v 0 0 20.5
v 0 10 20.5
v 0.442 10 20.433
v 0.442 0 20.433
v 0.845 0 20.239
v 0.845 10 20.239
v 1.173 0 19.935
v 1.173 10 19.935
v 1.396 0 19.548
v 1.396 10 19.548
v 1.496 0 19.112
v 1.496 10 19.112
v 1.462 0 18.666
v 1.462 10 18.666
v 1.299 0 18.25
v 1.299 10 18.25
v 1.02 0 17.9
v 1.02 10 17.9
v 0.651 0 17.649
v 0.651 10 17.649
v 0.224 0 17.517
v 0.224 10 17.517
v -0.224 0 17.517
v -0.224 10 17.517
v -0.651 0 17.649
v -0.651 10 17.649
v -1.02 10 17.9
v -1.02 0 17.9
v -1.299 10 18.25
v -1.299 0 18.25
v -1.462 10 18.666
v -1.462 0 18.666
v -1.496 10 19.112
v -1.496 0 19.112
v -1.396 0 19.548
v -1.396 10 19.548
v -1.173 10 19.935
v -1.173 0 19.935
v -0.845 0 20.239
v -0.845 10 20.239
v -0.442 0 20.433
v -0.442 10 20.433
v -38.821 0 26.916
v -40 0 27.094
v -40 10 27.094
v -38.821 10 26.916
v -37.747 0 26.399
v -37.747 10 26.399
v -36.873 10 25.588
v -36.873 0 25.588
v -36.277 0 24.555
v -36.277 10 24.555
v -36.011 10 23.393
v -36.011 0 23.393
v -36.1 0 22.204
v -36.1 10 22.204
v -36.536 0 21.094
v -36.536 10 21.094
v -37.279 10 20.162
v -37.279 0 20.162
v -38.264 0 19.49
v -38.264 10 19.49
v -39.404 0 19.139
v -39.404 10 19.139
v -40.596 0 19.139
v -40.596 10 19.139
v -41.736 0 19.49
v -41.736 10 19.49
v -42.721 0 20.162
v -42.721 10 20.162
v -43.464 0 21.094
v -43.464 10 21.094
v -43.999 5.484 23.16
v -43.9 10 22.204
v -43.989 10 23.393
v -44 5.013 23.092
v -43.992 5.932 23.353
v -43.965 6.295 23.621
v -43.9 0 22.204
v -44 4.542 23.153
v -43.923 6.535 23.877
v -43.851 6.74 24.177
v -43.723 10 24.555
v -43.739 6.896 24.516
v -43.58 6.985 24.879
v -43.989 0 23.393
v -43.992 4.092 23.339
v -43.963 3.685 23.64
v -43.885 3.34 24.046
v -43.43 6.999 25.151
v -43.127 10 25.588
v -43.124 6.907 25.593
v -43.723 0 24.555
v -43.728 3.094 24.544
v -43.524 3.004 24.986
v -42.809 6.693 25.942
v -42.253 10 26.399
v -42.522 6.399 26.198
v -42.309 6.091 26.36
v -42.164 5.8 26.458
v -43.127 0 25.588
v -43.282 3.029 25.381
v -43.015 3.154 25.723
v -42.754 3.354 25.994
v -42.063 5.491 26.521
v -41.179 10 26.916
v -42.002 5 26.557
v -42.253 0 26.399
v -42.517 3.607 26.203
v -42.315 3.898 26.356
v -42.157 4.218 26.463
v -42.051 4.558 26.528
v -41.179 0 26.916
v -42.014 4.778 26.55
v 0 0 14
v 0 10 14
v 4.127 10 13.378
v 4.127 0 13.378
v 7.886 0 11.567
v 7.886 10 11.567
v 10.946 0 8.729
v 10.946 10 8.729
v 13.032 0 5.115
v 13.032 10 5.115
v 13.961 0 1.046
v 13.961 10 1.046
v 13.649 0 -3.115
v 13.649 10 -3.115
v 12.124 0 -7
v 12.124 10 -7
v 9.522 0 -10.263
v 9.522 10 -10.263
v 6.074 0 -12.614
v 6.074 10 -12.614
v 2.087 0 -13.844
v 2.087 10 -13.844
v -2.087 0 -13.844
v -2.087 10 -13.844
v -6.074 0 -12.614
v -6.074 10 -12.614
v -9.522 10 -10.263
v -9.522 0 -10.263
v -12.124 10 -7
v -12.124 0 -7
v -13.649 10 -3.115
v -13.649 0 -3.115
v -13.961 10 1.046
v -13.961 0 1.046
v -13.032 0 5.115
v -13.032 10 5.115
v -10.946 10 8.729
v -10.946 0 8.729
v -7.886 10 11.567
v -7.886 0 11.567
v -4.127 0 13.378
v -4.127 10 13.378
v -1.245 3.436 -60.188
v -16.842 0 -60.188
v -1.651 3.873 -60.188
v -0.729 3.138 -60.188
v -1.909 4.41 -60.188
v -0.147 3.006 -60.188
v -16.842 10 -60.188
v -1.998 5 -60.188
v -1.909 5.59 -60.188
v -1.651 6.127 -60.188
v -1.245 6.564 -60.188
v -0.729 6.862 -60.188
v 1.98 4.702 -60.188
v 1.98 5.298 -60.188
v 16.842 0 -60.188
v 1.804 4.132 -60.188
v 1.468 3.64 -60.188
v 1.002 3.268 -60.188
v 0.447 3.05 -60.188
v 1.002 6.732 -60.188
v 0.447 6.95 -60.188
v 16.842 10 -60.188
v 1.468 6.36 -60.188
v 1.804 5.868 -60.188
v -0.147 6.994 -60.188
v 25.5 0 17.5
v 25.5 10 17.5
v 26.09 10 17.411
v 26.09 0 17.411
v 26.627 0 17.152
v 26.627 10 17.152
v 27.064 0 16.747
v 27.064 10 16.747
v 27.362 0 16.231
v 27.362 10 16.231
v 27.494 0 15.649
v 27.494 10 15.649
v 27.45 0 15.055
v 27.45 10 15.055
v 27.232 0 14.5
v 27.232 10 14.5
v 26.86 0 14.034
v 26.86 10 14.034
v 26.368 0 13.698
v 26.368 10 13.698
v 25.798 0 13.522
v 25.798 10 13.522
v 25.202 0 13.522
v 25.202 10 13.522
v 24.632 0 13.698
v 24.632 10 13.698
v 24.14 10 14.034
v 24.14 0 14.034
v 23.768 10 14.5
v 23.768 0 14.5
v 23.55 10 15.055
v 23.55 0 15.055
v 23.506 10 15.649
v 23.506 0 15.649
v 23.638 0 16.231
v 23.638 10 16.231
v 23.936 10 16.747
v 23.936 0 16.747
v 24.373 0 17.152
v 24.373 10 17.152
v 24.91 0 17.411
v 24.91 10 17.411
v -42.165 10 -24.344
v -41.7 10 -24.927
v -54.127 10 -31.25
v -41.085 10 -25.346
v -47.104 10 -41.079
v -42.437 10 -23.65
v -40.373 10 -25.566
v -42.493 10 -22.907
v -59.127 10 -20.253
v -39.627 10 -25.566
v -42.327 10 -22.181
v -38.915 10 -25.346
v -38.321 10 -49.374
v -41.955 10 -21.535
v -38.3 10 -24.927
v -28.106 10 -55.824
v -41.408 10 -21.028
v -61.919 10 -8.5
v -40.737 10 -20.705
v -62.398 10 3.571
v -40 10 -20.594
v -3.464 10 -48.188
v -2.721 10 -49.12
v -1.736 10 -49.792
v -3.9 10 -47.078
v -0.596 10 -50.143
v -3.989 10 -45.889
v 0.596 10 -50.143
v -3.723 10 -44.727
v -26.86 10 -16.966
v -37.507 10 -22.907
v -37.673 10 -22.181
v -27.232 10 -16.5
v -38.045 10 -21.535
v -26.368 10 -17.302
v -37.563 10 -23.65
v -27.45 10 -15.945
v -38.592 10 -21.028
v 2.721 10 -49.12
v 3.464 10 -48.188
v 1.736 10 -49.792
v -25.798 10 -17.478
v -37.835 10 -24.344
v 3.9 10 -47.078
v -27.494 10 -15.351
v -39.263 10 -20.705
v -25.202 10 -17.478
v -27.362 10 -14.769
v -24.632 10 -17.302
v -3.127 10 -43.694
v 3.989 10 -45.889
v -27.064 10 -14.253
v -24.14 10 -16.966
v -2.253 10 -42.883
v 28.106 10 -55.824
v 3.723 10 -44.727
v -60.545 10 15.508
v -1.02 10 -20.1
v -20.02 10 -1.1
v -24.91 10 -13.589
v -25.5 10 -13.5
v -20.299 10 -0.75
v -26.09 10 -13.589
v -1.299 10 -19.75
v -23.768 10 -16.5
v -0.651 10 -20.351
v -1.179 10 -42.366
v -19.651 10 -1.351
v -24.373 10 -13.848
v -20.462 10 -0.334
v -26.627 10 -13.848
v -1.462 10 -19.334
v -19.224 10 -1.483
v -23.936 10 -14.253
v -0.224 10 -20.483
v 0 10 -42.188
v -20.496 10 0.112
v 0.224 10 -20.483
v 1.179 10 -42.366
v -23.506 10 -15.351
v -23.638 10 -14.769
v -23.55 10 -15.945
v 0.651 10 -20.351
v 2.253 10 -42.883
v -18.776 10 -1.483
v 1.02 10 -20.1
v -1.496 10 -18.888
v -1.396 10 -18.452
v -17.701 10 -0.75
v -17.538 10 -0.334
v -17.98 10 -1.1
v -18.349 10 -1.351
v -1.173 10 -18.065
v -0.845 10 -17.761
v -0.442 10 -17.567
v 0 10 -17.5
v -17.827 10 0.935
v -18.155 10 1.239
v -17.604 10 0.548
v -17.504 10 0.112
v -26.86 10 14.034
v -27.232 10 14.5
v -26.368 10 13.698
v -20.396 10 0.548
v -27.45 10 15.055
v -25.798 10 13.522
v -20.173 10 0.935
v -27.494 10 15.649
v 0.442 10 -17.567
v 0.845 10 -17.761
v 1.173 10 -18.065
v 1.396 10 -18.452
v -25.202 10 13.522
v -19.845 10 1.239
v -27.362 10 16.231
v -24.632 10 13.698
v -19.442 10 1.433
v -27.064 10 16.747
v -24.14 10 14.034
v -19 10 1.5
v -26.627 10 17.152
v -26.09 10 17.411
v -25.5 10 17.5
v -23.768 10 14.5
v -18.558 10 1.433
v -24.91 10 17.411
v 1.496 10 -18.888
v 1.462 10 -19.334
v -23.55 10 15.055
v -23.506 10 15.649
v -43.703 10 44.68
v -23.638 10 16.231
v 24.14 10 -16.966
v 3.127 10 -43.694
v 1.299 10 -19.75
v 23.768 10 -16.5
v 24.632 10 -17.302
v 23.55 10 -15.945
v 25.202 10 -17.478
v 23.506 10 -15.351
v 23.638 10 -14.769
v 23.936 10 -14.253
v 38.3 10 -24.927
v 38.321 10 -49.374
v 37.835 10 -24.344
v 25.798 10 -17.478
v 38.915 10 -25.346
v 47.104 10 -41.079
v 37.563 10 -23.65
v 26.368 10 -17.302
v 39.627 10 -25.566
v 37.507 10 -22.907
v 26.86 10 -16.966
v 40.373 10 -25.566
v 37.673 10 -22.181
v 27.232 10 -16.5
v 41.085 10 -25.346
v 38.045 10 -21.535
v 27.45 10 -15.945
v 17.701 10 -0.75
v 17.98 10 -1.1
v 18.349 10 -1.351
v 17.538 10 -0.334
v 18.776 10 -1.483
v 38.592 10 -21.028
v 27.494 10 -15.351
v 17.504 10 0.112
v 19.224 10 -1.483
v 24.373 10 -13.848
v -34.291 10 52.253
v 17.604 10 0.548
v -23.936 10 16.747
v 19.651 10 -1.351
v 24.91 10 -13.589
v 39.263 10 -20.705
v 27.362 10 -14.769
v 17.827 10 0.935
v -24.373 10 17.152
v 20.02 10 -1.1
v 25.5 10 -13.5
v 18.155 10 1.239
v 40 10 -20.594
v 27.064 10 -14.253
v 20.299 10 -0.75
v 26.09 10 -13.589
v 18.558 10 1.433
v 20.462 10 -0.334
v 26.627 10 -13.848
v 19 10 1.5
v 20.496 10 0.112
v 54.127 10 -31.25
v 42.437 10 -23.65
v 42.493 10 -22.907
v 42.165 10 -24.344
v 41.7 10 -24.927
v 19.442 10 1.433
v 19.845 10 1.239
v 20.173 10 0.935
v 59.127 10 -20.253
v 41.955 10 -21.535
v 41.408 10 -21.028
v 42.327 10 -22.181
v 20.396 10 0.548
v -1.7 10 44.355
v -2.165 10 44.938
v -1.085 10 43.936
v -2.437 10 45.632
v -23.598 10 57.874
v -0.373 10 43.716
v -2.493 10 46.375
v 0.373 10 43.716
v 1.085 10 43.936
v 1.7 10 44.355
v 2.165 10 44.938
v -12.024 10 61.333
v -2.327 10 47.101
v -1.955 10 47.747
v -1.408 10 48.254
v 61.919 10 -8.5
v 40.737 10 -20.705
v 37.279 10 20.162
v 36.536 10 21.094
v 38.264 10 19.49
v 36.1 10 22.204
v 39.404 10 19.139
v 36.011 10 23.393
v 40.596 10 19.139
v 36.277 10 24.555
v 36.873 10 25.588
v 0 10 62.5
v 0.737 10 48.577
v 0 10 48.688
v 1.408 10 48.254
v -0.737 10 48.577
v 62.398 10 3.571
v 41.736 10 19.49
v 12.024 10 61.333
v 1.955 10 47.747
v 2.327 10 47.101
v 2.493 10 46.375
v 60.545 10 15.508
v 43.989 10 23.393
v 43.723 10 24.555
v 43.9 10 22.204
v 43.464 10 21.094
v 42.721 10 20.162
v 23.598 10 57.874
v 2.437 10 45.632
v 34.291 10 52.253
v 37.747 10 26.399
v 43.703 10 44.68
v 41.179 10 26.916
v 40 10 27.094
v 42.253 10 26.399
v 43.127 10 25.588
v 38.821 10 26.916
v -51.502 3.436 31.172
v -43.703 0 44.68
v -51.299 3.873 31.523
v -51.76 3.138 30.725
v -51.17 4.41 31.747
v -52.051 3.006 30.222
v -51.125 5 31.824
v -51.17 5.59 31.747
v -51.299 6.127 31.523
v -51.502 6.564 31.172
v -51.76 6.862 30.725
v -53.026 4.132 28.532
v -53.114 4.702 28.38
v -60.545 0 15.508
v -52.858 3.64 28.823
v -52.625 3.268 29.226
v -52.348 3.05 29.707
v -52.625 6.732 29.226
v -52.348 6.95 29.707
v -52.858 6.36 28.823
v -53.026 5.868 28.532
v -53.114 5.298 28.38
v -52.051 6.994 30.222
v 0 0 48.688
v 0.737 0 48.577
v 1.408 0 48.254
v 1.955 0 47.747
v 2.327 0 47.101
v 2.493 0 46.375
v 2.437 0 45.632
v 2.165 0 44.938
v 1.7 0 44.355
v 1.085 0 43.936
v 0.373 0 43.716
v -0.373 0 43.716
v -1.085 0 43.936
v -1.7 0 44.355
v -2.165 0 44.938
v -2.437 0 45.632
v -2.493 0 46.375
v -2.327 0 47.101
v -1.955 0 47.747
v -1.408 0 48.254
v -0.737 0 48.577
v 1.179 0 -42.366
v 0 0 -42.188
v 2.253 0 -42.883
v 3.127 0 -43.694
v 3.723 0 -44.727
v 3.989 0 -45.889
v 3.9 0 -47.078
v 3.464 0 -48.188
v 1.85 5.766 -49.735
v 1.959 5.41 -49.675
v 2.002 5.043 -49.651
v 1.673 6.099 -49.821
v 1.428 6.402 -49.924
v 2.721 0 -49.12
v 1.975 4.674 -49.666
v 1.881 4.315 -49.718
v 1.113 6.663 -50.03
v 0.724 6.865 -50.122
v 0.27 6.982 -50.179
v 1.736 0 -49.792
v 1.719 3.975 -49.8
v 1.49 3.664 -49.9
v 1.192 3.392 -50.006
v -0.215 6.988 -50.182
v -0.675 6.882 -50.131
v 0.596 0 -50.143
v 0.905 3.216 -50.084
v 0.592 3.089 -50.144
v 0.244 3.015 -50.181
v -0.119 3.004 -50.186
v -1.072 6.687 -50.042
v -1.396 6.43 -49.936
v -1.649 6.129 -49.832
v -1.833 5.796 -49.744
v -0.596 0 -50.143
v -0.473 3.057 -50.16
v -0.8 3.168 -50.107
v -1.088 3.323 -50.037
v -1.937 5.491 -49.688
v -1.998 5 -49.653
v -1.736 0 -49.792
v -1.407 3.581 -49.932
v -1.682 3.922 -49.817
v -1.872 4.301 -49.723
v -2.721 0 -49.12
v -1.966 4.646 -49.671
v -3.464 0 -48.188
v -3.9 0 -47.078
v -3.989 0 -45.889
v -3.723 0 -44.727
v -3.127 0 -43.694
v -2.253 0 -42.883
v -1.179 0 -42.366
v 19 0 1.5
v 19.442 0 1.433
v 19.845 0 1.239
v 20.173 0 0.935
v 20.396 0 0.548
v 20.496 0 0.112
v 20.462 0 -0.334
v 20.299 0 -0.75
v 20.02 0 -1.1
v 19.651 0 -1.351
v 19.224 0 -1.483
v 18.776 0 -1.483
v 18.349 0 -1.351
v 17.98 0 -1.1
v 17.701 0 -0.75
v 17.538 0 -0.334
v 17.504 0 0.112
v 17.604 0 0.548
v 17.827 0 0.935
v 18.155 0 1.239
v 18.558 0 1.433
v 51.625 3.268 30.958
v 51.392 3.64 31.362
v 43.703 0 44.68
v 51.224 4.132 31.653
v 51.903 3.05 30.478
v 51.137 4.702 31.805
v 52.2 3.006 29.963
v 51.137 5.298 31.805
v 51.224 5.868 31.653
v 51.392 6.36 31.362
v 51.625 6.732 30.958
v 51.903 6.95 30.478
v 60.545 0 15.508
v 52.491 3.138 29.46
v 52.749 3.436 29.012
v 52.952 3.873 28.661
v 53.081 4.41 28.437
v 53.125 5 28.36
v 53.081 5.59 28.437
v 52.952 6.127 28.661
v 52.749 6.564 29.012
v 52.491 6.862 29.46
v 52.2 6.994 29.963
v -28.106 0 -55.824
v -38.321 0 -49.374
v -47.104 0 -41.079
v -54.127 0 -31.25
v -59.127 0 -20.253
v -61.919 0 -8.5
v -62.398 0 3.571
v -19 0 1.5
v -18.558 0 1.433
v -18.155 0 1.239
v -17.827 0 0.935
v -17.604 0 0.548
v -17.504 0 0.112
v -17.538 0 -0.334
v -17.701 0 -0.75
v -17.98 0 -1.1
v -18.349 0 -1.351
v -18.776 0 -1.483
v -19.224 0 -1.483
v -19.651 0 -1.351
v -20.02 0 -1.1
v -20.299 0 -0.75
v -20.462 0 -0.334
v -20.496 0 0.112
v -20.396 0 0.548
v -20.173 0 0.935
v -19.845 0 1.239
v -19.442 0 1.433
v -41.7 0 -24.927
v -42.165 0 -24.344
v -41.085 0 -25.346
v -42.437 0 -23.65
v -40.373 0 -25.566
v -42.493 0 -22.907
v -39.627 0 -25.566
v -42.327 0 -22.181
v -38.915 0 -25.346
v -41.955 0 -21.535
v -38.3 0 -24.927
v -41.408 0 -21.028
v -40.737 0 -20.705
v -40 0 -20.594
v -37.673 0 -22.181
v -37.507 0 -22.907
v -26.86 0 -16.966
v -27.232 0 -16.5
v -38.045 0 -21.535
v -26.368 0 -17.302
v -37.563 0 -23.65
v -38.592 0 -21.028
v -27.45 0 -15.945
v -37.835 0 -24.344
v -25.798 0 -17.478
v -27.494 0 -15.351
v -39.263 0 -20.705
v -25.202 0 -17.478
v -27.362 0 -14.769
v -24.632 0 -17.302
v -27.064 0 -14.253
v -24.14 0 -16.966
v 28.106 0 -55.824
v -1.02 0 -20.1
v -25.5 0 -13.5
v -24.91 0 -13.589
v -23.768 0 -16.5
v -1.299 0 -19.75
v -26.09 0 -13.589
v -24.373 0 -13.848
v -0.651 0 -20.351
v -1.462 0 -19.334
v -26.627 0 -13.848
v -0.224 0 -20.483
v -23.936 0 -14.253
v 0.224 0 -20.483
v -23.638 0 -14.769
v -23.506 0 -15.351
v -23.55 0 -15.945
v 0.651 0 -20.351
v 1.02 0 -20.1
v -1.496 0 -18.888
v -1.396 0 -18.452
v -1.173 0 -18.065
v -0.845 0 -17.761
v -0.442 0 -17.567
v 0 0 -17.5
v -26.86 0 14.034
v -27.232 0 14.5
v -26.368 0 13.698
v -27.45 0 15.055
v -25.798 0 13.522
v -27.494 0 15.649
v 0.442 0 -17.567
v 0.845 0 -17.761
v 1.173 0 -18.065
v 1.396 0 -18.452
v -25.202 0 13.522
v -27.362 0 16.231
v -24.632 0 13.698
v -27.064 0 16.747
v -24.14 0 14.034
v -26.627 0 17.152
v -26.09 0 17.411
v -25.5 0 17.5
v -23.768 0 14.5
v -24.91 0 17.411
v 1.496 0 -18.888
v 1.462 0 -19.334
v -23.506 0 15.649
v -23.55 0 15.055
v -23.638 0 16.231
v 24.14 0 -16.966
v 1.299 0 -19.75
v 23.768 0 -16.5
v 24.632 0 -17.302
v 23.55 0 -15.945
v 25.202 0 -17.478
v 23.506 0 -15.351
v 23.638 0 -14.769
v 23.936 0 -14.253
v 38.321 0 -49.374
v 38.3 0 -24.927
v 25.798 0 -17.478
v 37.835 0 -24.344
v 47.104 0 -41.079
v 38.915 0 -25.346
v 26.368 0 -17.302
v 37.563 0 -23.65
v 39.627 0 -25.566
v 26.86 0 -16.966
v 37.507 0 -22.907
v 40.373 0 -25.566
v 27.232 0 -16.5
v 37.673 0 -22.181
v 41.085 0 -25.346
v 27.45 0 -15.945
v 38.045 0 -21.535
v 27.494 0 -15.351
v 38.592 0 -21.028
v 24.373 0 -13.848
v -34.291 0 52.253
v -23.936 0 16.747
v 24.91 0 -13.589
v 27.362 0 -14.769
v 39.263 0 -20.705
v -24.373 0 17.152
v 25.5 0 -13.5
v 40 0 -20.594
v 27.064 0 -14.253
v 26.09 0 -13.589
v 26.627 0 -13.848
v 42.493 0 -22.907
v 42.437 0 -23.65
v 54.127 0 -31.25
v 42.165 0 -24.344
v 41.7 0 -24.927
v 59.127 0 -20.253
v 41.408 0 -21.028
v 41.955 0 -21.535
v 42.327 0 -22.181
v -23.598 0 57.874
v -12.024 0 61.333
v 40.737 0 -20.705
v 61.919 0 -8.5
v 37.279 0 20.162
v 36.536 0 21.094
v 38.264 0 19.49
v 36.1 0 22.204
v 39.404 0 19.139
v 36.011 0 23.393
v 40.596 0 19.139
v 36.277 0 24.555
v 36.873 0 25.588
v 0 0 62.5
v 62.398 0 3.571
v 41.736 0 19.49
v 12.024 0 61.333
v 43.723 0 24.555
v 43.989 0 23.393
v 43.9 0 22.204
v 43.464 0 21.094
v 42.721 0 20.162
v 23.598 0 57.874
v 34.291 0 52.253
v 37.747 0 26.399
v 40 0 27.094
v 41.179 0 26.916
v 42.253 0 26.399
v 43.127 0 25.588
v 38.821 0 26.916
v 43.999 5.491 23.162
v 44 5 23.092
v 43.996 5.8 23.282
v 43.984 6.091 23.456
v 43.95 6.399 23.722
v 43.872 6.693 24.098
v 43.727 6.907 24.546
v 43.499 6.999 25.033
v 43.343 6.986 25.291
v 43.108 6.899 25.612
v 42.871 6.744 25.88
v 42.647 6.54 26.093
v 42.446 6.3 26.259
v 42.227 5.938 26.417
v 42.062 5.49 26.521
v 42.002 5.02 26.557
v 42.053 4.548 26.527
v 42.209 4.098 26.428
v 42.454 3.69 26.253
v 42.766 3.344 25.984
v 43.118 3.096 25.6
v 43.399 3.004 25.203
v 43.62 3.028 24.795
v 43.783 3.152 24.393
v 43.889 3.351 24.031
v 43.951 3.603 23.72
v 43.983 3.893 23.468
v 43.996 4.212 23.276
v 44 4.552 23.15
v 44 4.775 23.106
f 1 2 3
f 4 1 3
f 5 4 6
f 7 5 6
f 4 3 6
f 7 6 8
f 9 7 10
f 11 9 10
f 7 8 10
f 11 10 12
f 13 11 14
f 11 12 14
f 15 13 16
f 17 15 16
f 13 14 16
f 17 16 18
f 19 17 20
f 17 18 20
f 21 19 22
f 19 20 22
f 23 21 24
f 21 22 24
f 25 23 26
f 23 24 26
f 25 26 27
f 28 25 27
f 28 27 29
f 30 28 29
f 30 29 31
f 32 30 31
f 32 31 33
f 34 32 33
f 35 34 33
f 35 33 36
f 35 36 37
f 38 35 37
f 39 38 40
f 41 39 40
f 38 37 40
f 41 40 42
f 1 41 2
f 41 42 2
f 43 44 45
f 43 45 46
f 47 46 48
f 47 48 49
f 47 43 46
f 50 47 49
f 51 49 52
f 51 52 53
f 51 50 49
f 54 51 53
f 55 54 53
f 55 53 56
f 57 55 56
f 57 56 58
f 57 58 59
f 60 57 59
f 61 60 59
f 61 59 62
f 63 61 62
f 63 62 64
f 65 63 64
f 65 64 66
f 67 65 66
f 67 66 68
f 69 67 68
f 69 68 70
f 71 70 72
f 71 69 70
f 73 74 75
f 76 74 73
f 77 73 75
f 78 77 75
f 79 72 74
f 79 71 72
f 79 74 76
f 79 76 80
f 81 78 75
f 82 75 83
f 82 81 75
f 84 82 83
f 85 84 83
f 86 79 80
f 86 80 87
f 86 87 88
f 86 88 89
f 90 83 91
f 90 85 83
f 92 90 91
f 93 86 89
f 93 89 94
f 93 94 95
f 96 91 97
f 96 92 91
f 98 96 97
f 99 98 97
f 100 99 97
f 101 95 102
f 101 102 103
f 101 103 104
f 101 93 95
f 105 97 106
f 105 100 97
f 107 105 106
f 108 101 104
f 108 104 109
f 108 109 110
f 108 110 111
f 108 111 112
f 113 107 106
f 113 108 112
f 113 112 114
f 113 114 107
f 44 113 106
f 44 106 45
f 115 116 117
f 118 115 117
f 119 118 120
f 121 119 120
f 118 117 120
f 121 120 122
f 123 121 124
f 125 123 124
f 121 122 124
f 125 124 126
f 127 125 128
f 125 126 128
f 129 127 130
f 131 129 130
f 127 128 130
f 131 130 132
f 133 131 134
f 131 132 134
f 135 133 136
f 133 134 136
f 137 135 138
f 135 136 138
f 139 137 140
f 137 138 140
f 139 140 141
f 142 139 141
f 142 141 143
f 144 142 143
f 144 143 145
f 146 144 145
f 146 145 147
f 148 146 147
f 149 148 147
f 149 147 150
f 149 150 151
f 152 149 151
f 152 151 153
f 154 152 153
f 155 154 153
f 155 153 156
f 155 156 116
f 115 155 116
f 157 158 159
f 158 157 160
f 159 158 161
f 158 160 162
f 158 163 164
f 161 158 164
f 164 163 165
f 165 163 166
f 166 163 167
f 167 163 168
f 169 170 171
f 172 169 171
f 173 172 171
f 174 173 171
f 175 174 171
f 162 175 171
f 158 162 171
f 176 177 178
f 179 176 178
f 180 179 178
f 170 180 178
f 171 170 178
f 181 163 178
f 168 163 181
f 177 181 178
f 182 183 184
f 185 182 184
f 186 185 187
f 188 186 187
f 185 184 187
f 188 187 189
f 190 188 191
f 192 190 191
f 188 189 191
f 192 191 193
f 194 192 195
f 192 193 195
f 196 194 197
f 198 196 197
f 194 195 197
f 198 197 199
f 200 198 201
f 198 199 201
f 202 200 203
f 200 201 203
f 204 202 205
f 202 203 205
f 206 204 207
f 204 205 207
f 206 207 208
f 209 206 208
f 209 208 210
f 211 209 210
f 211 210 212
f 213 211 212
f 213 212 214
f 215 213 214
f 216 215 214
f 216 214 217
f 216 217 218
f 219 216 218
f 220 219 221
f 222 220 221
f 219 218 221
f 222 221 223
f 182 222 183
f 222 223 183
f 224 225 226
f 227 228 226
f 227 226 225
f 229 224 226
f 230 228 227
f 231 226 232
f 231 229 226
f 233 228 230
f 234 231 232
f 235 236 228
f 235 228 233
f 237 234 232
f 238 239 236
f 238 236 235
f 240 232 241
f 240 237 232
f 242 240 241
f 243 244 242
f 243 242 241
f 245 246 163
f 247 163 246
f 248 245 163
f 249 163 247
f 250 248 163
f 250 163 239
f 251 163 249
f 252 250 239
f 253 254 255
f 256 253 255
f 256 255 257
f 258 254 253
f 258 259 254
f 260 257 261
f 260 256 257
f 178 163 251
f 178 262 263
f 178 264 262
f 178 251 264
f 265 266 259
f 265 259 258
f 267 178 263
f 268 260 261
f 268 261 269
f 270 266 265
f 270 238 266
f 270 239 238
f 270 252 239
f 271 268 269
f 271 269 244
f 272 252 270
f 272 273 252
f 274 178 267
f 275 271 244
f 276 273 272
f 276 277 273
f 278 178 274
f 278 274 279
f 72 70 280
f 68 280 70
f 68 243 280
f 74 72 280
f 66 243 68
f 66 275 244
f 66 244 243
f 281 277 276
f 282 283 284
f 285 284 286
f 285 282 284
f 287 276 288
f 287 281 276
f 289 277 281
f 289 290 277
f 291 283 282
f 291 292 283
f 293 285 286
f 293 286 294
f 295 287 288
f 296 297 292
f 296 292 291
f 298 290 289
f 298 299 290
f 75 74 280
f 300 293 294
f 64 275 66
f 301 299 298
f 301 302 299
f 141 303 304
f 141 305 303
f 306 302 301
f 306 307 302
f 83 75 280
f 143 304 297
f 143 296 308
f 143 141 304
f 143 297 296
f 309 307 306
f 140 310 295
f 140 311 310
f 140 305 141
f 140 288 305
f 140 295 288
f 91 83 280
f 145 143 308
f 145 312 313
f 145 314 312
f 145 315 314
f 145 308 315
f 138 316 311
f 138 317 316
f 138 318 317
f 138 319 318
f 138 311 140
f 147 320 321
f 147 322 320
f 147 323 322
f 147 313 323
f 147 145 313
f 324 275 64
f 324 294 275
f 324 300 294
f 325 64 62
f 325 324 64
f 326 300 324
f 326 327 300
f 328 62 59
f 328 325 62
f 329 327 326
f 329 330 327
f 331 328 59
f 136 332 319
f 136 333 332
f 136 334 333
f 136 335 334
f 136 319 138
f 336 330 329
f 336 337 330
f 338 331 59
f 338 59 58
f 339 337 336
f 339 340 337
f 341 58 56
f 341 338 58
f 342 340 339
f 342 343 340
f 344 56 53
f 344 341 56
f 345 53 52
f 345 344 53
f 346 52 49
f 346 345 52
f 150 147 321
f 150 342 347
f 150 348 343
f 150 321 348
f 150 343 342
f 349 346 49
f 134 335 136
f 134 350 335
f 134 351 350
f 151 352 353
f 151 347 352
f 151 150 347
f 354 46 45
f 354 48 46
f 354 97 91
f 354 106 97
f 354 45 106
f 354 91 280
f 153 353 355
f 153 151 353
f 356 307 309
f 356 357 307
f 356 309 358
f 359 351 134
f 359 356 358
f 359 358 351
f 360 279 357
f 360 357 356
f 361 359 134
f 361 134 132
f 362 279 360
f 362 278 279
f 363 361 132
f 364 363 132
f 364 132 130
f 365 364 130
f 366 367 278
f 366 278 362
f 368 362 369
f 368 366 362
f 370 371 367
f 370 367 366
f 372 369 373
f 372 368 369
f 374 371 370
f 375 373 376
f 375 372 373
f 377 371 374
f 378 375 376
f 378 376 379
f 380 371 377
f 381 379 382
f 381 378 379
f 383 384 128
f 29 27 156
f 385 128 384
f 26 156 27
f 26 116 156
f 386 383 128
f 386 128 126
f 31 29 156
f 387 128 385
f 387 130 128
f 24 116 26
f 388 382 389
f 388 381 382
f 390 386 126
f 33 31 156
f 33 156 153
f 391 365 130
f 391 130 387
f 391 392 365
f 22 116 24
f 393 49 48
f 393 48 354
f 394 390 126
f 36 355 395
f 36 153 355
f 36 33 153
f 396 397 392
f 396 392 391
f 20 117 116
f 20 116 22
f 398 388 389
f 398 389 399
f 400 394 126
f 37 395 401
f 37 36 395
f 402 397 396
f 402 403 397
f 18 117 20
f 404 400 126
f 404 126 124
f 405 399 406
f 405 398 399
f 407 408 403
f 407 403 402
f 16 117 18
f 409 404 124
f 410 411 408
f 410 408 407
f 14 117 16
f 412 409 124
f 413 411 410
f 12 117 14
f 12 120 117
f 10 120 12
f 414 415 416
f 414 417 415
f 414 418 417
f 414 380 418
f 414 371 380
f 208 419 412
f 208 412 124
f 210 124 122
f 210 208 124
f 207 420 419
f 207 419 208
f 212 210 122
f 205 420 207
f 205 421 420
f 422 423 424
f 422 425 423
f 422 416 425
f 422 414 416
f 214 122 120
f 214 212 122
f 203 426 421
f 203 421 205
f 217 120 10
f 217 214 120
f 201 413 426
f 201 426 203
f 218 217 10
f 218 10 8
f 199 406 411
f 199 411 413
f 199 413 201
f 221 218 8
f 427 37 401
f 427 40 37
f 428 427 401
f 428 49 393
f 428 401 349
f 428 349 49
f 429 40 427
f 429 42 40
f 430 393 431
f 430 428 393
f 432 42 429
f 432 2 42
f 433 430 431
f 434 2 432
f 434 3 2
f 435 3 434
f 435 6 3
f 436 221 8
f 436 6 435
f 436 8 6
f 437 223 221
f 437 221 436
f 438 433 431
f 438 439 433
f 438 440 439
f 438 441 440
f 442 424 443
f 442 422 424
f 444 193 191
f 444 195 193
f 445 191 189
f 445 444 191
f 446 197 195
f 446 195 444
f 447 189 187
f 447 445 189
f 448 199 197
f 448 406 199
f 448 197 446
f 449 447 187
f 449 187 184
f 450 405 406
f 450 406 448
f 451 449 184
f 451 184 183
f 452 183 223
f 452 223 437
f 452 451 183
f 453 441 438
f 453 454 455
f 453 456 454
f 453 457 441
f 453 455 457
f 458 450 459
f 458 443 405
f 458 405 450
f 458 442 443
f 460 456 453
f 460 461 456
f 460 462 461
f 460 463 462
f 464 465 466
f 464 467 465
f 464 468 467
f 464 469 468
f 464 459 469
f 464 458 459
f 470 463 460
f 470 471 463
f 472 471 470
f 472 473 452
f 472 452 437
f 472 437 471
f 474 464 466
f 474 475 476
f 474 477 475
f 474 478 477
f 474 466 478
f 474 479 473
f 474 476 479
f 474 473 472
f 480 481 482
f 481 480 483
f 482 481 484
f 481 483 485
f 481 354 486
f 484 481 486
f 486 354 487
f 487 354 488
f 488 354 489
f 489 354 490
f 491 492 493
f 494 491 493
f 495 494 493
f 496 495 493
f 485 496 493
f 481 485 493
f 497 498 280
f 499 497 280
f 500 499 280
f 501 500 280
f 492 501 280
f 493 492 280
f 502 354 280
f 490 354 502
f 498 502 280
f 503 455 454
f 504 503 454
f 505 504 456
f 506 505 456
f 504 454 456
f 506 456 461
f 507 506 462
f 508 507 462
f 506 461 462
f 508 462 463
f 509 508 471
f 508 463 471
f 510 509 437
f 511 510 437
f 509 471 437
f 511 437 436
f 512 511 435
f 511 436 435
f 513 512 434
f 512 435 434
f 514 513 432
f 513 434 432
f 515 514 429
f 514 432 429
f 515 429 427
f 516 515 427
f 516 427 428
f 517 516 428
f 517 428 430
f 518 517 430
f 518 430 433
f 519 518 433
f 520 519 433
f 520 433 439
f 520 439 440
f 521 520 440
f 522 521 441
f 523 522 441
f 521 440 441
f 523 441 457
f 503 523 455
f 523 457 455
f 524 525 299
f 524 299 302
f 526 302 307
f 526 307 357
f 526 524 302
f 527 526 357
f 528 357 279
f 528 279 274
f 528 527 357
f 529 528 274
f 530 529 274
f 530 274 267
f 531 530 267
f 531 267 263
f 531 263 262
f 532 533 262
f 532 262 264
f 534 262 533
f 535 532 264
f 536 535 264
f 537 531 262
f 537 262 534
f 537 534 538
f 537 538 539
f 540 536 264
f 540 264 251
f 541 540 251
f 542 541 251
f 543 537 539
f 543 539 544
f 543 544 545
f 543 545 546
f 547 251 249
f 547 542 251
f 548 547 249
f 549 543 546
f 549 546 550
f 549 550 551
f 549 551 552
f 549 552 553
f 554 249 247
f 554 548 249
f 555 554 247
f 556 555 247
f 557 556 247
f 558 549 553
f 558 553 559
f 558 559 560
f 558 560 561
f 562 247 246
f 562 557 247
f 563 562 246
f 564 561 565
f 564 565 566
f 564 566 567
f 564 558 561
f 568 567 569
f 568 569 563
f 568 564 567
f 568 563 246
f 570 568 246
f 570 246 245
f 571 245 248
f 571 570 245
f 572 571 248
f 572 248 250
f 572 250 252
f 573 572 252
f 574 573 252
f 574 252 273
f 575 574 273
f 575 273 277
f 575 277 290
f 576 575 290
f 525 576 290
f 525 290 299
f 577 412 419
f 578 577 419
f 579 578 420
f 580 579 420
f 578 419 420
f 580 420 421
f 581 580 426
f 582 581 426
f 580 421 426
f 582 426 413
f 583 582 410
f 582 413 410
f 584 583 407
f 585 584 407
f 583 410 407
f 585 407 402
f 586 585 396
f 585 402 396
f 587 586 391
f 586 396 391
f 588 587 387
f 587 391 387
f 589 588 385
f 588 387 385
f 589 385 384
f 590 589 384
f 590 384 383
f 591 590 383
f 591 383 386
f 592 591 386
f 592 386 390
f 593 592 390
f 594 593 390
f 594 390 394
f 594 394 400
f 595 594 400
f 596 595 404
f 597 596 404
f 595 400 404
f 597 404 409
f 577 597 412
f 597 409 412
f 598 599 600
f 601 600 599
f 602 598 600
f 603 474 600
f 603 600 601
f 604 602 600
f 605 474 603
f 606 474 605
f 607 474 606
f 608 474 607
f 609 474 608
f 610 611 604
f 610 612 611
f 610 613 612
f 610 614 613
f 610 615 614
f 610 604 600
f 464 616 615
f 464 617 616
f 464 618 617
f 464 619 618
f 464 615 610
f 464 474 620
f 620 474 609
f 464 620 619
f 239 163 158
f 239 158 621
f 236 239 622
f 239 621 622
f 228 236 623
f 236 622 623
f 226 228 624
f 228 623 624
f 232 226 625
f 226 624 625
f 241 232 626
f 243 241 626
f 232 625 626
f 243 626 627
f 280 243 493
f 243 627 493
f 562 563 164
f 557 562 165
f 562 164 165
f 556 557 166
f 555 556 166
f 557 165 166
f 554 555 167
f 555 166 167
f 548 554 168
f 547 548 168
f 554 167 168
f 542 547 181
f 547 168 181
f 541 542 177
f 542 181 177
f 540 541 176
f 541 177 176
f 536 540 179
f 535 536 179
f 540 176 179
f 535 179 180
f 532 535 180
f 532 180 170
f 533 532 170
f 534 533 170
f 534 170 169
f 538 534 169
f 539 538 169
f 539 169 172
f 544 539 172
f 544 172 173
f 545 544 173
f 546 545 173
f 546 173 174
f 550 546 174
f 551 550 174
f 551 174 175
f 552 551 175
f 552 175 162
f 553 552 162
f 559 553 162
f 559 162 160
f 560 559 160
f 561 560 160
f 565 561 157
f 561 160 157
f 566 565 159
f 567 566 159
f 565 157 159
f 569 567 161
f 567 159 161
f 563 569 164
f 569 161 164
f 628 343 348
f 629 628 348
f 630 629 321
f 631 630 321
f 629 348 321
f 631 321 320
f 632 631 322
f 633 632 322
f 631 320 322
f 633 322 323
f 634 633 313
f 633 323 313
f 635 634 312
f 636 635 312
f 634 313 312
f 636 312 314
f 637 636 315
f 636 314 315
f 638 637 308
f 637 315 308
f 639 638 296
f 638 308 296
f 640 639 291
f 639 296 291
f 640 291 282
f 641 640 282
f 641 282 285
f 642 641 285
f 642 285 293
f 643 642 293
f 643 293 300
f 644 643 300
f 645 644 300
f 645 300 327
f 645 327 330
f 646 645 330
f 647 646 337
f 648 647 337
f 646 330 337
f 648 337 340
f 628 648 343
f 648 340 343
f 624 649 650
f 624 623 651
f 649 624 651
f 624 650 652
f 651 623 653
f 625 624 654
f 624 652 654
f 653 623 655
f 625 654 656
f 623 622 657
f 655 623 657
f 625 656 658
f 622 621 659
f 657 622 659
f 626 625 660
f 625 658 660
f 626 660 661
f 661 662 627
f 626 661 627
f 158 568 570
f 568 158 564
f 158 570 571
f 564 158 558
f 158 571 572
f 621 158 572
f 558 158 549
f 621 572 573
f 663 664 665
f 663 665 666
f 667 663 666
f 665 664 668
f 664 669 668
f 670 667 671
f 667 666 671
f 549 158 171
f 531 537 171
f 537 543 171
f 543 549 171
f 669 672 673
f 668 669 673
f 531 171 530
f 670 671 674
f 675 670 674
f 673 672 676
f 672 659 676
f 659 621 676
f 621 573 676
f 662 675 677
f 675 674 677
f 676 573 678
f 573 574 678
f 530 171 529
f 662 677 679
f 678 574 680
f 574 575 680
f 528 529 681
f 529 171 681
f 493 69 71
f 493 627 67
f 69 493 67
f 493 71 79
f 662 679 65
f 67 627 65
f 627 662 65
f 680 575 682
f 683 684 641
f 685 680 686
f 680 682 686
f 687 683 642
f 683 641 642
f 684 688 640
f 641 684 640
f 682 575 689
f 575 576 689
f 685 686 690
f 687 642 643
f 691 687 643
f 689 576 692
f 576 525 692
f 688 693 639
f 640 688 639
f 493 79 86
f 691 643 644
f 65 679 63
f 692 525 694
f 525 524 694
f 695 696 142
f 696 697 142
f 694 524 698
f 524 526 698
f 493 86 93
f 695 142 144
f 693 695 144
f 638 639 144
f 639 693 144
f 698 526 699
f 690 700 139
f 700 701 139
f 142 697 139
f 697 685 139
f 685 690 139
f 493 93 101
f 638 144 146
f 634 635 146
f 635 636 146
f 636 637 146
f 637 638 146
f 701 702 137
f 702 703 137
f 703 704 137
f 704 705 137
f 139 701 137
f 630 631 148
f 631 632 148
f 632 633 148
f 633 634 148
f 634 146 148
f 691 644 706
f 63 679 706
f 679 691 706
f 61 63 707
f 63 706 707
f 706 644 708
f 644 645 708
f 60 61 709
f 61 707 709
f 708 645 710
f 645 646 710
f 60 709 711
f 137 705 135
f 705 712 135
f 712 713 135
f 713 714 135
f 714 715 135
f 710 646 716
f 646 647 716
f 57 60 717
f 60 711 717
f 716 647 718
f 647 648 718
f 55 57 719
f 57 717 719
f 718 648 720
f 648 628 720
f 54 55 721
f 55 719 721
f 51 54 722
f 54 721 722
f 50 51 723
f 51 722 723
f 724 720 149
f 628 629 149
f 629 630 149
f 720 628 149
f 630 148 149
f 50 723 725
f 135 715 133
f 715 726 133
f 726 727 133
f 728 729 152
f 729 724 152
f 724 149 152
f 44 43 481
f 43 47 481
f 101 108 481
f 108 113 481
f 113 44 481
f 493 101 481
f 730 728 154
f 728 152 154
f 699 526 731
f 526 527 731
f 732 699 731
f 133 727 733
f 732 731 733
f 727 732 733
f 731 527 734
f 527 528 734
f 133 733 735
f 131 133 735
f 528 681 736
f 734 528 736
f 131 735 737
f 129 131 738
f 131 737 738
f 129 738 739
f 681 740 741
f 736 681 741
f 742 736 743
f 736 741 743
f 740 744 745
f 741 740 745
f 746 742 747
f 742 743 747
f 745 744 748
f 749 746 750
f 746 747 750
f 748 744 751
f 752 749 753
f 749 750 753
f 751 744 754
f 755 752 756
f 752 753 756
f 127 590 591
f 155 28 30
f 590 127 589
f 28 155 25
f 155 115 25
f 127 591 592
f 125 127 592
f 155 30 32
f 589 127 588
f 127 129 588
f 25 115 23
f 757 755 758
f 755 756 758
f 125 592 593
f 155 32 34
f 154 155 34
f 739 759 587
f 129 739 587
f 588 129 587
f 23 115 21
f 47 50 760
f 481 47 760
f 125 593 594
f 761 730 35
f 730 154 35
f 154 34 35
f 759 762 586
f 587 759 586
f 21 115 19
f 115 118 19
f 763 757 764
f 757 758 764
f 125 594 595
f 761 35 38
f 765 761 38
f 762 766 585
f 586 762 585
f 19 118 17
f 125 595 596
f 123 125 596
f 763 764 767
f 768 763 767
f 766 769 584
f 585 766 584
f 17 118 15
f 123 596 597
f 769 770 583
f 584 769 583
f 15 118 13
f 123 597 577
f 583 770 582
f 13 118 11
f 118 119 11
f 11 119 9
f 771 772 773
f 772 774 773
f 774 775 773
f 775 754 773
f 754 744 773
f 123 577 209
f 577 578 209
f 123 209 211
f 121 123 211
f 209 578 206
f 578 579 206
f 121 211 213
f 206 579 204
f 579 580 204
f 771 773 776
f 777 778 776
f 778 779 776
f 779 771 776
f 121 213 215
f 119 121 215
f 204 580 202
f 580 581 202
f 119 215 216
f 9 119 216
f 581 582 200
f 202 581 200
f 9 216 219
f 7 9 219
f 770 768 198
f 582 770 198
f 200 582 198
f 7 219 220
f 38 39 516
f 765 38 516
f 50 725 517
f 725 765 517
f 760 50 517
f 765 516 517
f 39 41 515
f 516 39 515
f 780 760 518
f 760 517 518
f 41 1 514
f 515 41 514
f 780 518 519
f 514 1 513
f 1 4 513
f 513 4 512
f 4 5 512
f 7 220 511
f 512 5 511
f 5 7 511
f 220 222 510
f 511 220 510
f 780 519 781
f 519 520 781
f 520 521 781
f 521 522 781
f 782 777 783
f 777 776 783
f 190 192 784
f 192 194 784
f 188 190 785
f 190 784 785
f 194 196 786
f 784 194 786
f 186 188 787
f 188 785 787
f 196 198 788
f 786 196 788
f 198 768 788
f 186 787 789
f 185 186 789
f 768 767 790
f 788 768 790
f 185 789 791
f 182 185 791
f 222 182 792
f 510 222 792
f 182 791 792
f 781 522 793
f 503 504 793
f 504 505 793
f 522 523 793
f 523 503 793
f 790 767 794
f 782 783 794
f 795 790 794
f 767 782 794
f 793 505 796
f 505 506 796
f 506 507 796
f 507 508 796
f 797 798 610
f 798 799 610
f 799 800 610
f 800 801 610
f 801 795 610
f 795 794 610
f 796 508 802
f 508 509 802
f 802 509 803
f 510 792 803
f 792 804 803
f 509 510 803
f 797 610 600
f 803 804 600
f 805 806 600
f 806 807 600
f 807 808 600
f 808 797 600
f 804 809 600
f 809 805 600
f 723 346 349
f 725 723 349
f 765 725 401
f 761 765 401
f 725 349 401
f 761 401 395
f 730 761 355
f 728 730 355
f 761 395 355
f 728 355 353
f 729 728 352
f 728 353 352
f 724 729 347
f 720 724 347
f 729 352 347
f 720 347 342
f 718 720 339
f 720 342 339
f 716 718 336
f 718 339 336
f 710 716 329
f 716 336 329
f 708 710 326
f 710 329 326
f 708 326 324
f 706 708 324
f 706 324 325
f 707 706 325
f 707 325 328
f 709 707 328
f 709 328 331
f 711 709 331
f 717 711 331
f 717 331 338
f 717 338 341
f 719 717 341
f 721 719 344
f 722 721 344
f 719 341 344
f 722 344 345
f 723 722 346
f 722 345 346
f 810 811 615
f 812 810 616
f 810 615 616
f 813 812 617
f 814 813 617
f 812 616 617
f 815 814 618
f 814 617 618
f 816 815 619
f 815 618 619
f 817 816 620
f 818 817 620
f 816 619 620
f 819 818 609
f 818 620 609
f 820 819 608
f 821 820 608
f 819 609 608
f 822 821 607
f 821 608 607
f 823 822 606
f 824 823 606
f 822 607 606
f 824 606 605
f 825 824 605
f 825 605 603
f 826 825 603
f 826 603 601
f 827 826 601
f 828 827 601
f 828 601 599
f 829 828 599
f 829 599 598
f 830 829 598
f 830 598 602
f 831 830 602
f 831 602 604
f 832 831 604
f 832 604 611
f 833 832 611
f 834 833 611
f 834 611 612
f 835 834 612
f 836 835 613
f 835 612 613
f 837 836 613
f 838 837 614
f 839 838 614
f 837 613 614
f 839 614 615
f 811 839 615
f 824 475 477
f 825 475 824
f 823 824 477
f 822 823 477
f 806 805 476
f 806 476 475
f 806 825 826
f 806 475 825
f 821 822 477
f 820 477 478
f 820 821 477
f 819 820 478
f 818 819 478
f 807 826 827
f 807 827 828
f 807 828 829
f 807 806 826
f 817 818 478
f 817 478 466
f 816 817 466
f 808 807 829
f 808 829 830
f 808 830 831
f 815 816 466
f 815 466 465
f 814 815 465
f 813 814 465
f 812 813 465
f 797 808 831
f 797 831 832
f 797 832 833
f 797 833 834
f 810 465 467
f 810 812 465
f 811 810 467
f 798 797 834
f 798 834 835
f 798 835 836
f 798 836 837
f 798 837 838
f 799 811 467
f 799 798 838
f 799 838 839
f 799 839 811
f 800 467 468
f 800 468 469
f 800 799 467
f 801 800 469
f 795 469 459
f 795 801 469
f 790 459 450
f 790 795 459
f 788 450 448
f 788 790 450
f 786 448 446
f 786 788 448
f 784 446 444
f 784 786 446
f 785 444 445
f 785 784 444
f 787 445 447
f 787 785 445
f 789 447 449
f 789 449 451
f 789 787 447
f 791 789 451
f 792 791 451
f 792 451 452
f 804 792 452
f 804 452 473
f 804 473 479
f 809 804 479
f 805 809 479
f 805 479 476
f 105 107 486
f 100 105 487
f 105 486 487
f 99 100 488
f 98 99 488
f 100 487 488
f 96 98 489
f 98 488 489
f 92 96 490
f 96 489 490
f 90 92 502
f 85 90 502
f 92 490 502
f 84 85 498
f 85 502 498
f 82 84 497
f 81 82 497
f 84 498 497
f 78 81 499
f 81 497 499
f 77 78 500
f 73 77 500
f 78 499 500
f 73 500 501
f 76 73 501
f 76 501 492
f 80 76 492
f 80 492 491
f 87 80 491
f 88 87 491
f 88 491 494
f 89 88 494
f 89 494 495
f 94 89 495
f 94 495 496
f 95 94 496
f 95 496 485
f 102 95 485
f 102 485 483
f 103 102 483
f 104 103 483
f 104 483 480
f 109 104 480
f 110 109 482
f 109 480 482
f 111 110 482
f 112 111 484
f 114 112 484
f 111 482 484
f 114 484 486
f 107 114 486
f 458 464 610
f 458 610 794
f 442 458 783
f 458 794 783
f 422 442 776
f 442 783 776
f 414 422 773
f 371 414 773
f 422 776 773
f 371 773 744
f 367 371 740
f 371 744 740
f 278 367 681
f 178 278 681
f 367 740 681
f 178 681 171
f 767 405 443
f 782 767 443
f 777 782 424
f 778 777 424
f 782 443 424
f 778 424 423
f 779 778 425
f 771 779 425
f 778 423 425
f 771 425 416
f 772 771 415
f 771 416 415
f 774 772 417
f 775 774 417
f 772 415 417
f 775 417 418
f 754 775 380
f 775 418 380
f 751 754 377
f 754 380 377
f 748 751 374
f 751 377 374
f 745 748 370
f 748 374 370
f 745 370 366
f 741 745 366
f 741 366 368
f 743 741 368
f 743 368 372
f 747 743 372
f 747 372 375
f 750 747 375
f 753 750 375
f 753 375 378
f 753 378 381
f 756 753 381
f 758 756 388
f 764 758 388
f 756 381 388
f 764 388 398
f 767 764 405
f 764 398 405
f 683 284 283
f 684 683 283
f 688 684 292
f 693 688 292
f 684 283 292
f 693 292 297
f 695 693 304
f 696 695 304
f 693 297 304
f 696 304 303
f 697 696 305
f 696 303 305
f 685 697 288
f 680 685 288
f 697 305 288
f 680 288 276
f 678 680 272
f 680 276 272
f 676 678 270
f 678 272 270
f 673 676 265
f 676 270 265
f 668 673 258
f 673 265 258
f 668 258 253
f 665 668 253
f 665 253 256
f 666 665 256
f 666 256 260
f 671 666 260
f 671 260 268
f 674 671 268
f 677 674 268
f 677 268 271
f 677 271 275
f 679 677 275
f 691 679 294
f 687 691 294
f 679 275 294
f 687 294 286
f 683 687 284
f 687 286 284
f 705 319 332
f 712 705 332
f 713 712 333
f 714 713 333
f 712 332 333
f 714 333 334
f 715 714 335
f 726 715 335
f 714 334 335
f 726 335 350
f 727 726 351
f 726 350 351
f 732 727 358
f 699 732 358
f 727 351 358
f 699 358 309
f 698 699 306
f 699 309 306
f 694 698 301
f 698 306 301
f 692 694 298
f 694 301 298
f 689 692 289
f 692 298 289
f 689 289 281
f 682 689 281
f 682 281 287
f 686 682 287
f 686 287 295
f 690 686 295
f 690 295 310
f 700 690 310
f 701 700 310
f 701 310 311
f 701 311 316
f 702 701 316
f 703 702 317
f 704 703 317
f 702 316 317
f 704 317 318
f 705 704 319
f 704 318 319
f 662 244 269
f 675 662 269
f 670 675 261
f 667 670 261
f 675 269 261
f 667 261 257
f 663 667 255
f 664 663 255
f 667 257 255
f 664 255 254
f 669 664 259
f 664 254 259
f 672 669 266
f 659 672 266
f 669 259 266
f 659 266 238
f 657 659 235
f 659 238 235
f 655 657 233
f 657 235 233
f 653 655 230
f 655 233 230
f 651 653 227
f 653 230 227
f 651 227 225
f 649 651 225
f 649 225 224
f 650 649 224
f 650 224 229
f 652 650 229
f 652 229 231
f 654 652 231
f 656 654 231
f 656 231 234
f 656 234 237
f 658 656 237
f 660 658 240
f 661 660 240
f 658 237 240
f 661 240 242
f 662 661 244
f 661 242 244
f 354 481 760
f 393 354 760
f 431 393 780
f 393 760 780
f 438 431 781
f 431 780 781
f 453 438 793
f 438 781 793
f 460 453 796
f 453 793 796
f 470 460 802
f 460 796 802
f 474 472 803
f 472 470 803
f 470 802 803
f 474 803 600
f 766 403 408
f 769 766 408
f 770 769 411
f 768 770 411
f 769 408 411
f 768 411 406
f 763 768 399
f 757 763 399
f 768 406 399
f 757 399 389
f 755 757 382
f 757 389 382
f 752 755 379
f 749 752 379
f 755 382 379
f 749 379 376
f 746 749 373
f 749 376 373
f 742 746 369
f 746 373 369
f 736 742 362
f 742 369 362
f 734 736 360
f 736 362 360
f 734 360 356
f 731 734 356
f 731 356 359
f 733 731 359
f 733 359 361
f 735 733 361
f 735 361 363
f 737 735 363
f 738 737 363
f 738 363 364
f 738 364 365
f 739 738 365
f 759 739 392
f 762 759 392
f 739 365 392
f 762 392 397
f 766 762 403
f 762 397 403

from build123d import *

# Parameters (mm, degrees)
SKETCH1_R           = 62.5
SKETCH1_R_2         = 4
BOSS_EXTRUDE1_DEPTH = 10
SKETCH2_W           = 43.972180284
SKETCH2_H           = 8.711954994
CUT_EXTRUDE1_DEPTH  = 10
SKETCH3_R           = 2
CUT_EXTRUDE2_DEPTH  = 12
SKETCH4_R           = 2
CUT_EXTRUDE3_DEPTH  = 12
SKETCH5_R           = 2
CUT_EXTRUDE4_DEPTH  = 12
SKETCH6_R           = 14
CUT_EXTRUDE5_DEPTH  = 12
SKETCH7_R           = 1.5
CUT_EXTRUDE6_DEPTH  = 10
SKETCH8_R           = 2
CUT_EXTRUDE7_DEPTH  = 10
SKETCH9_R           = 2.5
CUT_EXTRUDE8_DEPTH  = 10


with BuildPart() as part:
    # Sketch1 → Boss-Extrude1 (new body)
    with BuildSketch(Plane(origin=(0, 0, 0), x_dir=(1, 0, 0), z_dir=(0, 1, 0))):
        with Locations(Location((0, 0, 0), (0, 0, 270))):
            Circle(SKETCH1_R)
        with Locations(Location((0, 46.188021535, 0), (0, 0, 270))):
            Circle(SKETCH1_R_2, mode=Mode.SUBTRACT)
        with Locations(Location((40, -23.094010768, 0), (0, 0, 270))):
            Circle(SKETCH1_R_2, mode=Mode.SUBTRACT)
        with Locations(Location((-40, -23.094010768, 0), (0, 0, 270))):
            Circle(SKETCH1_R_2, mode=Mode.SUBTRACT)
    extrude(amount=BOSS_EXTRUDE1_DEPTH)

    # Sketch2 → Cut-Extrude1 (cut)
    with BuildSketch(Plane(origin=(0, 10, 0), x_dir=(1, 0, 0), z_dir=(0, 1, 0))):
        Polygon((-39.581845605, -51.818275424), (-64.713070734, -8.289716646), (-77.687460418, -15.780484023), (-52.55623529, -59.309042801), align=None)
        Polygon((40.609652539, -50.038061596), (63.321086643, -10.700703814), (75.641288558, -17.813775707), (52.929854454, -57.151133488), align=None)
        with Locations((0.471086747, 64.543999032)):
            Rectangle(SKETCH2_W, SKETCH2_H)
    extrude(amount=-CUT_EXTRUDE1_DEPTH, mode=Mode.SUBTRACT)

    # Sketch3 → Cut-Extrude2 (cut)
    with BuildSketch(Plane(origin=(52.124355653, 0, 30.094010768), x_dir=(0.49999999999999983, 0, -0.8660254037844387), z_dir=(0.8660254037844387, 0, 0.49999999999999983))):
        with Locations((0.001973272, 5)):
            Circle(SKETCH3_R)
    extrude(amount=-CUT_EXTRUDE2_DEPTH, mode=Mode.SUBTRACT)

    # Sketch4 → Cut-Extrude3 (cut)
    with BuildSketch(Plane(origin=(-52.124355653, 0, 30.094010768), x_dir=(0.5000000000000002, 0, 0.8660254037844386), z_dir=(-0.8660254037844385, 0, 0.5000000000000001))):
        with Locations((-0.001973272, 5)):
            Circle(SKETCH4_R)
    extrude(amount=-CUT_EXTRUDE3_DEPTH, mode=Mode.SUBTRACT)

    # Sketch5 → Cut-Extrude4 (cut)
    with BuildSketch(Plane(origin=(0, 0, -60.188021535), x_dir=(-1, 0, 0), z_dir=(0, 0, -1))):
        with Locations((-0.001973272, 5)):
            Circle(SKETCH5_R)
    extrude(amount=-CUT_EXTRUDE4_DEPTH, mode=Mode.SUBTRACT)

    # Sketch6 → Cut-Extrude5 (cut)
    with BuildSketch(Plane(origin=(0, 10, 0), x_dir=(1, 0, 0), z_dir=(0, 1, 0))):
        with Locations(Location((0, 0, 0), (0, 0, 270))):
            Circle(SKETCH6_R)
    extrude(amount=-CUT_EXTRUDE5_DEPTH, mode=Mode.SUBTRACT)

    # Sketch7 → Cut-Extrude6 (cut)
    with BuildSketch(Plane(origin=(0, 10, 0), x_dir=(1, 0, 0), z_dir=(0, 1, 0))):
        with Locations(Location((0, 19, 0), (0, 0, 270))):
            Circle(SKETCH7_R)
        with Locations(Location((19, 0, 0), (0, 0, 270))):
            Circle(SKETCH7_R)
        with Locations(Location((0, -19, 0), (0, 0, 270))):
            Circle(SKETCH7_R)
        with Locations(Location((-19, 0, 0), (0, 0, 270))):
            Circle(SKETCH7_R)
    extrude(amount=-CUT_EXTRUDE6_DEPTH, mode=Mode.SUBTRACT)

    # Sketch8 → Cut-Extrude7 (cut)
    with BuildSketch(Plane(origin=(0, 10, 0), x_dir=(1, 0, 0), z_dir=(0, 1, 0))):
        with Locations(Location((-25.5, 15.5, 0), (0, 0, 270))):
            Circle(SKETCH8_R)
        with Locations(Location((25.5, 15.5, 0), (0, 0, 270))):
            Circle(SKETCH8_R)
        with Locations(Location((25.5, -15.5, 0), (0, 0, 270))):
            Circle(SKETCH8_R)
        with Locations(Location((-25.5, -15.5, 0), (0, 0, 270))):
            Circle(SKETCH8_R)
    extrude(amount=-CUT_EXTRUDE7_DEPTH, mode=Mode.SUBTRACT)

    # Sketch9 → Cut-Extrude8 (cut)
    with BuildSketch(Plane(origin=(0, 10, 0), x_dir=(1, 0, 0), z_dir=(0, 1, 0))):
        with Locations(Location((-40, 23.094010768, 0), (0, 0, 270))):
            Circle(SKETCH9_R)
        with Locations(Location((40, 23.094010768, 0), (0, 0, 270))):
            Circle(SKETCH9_R)
        with Locations(Location((0, -46.188021535, 0), (0, 0, 270))):
            Circle(SKETCH9_R)
    extrude(amount=-CUT_EXTRUDE8_DEPTH, mode=Mode.SUBTRACT)


solid = part.part
